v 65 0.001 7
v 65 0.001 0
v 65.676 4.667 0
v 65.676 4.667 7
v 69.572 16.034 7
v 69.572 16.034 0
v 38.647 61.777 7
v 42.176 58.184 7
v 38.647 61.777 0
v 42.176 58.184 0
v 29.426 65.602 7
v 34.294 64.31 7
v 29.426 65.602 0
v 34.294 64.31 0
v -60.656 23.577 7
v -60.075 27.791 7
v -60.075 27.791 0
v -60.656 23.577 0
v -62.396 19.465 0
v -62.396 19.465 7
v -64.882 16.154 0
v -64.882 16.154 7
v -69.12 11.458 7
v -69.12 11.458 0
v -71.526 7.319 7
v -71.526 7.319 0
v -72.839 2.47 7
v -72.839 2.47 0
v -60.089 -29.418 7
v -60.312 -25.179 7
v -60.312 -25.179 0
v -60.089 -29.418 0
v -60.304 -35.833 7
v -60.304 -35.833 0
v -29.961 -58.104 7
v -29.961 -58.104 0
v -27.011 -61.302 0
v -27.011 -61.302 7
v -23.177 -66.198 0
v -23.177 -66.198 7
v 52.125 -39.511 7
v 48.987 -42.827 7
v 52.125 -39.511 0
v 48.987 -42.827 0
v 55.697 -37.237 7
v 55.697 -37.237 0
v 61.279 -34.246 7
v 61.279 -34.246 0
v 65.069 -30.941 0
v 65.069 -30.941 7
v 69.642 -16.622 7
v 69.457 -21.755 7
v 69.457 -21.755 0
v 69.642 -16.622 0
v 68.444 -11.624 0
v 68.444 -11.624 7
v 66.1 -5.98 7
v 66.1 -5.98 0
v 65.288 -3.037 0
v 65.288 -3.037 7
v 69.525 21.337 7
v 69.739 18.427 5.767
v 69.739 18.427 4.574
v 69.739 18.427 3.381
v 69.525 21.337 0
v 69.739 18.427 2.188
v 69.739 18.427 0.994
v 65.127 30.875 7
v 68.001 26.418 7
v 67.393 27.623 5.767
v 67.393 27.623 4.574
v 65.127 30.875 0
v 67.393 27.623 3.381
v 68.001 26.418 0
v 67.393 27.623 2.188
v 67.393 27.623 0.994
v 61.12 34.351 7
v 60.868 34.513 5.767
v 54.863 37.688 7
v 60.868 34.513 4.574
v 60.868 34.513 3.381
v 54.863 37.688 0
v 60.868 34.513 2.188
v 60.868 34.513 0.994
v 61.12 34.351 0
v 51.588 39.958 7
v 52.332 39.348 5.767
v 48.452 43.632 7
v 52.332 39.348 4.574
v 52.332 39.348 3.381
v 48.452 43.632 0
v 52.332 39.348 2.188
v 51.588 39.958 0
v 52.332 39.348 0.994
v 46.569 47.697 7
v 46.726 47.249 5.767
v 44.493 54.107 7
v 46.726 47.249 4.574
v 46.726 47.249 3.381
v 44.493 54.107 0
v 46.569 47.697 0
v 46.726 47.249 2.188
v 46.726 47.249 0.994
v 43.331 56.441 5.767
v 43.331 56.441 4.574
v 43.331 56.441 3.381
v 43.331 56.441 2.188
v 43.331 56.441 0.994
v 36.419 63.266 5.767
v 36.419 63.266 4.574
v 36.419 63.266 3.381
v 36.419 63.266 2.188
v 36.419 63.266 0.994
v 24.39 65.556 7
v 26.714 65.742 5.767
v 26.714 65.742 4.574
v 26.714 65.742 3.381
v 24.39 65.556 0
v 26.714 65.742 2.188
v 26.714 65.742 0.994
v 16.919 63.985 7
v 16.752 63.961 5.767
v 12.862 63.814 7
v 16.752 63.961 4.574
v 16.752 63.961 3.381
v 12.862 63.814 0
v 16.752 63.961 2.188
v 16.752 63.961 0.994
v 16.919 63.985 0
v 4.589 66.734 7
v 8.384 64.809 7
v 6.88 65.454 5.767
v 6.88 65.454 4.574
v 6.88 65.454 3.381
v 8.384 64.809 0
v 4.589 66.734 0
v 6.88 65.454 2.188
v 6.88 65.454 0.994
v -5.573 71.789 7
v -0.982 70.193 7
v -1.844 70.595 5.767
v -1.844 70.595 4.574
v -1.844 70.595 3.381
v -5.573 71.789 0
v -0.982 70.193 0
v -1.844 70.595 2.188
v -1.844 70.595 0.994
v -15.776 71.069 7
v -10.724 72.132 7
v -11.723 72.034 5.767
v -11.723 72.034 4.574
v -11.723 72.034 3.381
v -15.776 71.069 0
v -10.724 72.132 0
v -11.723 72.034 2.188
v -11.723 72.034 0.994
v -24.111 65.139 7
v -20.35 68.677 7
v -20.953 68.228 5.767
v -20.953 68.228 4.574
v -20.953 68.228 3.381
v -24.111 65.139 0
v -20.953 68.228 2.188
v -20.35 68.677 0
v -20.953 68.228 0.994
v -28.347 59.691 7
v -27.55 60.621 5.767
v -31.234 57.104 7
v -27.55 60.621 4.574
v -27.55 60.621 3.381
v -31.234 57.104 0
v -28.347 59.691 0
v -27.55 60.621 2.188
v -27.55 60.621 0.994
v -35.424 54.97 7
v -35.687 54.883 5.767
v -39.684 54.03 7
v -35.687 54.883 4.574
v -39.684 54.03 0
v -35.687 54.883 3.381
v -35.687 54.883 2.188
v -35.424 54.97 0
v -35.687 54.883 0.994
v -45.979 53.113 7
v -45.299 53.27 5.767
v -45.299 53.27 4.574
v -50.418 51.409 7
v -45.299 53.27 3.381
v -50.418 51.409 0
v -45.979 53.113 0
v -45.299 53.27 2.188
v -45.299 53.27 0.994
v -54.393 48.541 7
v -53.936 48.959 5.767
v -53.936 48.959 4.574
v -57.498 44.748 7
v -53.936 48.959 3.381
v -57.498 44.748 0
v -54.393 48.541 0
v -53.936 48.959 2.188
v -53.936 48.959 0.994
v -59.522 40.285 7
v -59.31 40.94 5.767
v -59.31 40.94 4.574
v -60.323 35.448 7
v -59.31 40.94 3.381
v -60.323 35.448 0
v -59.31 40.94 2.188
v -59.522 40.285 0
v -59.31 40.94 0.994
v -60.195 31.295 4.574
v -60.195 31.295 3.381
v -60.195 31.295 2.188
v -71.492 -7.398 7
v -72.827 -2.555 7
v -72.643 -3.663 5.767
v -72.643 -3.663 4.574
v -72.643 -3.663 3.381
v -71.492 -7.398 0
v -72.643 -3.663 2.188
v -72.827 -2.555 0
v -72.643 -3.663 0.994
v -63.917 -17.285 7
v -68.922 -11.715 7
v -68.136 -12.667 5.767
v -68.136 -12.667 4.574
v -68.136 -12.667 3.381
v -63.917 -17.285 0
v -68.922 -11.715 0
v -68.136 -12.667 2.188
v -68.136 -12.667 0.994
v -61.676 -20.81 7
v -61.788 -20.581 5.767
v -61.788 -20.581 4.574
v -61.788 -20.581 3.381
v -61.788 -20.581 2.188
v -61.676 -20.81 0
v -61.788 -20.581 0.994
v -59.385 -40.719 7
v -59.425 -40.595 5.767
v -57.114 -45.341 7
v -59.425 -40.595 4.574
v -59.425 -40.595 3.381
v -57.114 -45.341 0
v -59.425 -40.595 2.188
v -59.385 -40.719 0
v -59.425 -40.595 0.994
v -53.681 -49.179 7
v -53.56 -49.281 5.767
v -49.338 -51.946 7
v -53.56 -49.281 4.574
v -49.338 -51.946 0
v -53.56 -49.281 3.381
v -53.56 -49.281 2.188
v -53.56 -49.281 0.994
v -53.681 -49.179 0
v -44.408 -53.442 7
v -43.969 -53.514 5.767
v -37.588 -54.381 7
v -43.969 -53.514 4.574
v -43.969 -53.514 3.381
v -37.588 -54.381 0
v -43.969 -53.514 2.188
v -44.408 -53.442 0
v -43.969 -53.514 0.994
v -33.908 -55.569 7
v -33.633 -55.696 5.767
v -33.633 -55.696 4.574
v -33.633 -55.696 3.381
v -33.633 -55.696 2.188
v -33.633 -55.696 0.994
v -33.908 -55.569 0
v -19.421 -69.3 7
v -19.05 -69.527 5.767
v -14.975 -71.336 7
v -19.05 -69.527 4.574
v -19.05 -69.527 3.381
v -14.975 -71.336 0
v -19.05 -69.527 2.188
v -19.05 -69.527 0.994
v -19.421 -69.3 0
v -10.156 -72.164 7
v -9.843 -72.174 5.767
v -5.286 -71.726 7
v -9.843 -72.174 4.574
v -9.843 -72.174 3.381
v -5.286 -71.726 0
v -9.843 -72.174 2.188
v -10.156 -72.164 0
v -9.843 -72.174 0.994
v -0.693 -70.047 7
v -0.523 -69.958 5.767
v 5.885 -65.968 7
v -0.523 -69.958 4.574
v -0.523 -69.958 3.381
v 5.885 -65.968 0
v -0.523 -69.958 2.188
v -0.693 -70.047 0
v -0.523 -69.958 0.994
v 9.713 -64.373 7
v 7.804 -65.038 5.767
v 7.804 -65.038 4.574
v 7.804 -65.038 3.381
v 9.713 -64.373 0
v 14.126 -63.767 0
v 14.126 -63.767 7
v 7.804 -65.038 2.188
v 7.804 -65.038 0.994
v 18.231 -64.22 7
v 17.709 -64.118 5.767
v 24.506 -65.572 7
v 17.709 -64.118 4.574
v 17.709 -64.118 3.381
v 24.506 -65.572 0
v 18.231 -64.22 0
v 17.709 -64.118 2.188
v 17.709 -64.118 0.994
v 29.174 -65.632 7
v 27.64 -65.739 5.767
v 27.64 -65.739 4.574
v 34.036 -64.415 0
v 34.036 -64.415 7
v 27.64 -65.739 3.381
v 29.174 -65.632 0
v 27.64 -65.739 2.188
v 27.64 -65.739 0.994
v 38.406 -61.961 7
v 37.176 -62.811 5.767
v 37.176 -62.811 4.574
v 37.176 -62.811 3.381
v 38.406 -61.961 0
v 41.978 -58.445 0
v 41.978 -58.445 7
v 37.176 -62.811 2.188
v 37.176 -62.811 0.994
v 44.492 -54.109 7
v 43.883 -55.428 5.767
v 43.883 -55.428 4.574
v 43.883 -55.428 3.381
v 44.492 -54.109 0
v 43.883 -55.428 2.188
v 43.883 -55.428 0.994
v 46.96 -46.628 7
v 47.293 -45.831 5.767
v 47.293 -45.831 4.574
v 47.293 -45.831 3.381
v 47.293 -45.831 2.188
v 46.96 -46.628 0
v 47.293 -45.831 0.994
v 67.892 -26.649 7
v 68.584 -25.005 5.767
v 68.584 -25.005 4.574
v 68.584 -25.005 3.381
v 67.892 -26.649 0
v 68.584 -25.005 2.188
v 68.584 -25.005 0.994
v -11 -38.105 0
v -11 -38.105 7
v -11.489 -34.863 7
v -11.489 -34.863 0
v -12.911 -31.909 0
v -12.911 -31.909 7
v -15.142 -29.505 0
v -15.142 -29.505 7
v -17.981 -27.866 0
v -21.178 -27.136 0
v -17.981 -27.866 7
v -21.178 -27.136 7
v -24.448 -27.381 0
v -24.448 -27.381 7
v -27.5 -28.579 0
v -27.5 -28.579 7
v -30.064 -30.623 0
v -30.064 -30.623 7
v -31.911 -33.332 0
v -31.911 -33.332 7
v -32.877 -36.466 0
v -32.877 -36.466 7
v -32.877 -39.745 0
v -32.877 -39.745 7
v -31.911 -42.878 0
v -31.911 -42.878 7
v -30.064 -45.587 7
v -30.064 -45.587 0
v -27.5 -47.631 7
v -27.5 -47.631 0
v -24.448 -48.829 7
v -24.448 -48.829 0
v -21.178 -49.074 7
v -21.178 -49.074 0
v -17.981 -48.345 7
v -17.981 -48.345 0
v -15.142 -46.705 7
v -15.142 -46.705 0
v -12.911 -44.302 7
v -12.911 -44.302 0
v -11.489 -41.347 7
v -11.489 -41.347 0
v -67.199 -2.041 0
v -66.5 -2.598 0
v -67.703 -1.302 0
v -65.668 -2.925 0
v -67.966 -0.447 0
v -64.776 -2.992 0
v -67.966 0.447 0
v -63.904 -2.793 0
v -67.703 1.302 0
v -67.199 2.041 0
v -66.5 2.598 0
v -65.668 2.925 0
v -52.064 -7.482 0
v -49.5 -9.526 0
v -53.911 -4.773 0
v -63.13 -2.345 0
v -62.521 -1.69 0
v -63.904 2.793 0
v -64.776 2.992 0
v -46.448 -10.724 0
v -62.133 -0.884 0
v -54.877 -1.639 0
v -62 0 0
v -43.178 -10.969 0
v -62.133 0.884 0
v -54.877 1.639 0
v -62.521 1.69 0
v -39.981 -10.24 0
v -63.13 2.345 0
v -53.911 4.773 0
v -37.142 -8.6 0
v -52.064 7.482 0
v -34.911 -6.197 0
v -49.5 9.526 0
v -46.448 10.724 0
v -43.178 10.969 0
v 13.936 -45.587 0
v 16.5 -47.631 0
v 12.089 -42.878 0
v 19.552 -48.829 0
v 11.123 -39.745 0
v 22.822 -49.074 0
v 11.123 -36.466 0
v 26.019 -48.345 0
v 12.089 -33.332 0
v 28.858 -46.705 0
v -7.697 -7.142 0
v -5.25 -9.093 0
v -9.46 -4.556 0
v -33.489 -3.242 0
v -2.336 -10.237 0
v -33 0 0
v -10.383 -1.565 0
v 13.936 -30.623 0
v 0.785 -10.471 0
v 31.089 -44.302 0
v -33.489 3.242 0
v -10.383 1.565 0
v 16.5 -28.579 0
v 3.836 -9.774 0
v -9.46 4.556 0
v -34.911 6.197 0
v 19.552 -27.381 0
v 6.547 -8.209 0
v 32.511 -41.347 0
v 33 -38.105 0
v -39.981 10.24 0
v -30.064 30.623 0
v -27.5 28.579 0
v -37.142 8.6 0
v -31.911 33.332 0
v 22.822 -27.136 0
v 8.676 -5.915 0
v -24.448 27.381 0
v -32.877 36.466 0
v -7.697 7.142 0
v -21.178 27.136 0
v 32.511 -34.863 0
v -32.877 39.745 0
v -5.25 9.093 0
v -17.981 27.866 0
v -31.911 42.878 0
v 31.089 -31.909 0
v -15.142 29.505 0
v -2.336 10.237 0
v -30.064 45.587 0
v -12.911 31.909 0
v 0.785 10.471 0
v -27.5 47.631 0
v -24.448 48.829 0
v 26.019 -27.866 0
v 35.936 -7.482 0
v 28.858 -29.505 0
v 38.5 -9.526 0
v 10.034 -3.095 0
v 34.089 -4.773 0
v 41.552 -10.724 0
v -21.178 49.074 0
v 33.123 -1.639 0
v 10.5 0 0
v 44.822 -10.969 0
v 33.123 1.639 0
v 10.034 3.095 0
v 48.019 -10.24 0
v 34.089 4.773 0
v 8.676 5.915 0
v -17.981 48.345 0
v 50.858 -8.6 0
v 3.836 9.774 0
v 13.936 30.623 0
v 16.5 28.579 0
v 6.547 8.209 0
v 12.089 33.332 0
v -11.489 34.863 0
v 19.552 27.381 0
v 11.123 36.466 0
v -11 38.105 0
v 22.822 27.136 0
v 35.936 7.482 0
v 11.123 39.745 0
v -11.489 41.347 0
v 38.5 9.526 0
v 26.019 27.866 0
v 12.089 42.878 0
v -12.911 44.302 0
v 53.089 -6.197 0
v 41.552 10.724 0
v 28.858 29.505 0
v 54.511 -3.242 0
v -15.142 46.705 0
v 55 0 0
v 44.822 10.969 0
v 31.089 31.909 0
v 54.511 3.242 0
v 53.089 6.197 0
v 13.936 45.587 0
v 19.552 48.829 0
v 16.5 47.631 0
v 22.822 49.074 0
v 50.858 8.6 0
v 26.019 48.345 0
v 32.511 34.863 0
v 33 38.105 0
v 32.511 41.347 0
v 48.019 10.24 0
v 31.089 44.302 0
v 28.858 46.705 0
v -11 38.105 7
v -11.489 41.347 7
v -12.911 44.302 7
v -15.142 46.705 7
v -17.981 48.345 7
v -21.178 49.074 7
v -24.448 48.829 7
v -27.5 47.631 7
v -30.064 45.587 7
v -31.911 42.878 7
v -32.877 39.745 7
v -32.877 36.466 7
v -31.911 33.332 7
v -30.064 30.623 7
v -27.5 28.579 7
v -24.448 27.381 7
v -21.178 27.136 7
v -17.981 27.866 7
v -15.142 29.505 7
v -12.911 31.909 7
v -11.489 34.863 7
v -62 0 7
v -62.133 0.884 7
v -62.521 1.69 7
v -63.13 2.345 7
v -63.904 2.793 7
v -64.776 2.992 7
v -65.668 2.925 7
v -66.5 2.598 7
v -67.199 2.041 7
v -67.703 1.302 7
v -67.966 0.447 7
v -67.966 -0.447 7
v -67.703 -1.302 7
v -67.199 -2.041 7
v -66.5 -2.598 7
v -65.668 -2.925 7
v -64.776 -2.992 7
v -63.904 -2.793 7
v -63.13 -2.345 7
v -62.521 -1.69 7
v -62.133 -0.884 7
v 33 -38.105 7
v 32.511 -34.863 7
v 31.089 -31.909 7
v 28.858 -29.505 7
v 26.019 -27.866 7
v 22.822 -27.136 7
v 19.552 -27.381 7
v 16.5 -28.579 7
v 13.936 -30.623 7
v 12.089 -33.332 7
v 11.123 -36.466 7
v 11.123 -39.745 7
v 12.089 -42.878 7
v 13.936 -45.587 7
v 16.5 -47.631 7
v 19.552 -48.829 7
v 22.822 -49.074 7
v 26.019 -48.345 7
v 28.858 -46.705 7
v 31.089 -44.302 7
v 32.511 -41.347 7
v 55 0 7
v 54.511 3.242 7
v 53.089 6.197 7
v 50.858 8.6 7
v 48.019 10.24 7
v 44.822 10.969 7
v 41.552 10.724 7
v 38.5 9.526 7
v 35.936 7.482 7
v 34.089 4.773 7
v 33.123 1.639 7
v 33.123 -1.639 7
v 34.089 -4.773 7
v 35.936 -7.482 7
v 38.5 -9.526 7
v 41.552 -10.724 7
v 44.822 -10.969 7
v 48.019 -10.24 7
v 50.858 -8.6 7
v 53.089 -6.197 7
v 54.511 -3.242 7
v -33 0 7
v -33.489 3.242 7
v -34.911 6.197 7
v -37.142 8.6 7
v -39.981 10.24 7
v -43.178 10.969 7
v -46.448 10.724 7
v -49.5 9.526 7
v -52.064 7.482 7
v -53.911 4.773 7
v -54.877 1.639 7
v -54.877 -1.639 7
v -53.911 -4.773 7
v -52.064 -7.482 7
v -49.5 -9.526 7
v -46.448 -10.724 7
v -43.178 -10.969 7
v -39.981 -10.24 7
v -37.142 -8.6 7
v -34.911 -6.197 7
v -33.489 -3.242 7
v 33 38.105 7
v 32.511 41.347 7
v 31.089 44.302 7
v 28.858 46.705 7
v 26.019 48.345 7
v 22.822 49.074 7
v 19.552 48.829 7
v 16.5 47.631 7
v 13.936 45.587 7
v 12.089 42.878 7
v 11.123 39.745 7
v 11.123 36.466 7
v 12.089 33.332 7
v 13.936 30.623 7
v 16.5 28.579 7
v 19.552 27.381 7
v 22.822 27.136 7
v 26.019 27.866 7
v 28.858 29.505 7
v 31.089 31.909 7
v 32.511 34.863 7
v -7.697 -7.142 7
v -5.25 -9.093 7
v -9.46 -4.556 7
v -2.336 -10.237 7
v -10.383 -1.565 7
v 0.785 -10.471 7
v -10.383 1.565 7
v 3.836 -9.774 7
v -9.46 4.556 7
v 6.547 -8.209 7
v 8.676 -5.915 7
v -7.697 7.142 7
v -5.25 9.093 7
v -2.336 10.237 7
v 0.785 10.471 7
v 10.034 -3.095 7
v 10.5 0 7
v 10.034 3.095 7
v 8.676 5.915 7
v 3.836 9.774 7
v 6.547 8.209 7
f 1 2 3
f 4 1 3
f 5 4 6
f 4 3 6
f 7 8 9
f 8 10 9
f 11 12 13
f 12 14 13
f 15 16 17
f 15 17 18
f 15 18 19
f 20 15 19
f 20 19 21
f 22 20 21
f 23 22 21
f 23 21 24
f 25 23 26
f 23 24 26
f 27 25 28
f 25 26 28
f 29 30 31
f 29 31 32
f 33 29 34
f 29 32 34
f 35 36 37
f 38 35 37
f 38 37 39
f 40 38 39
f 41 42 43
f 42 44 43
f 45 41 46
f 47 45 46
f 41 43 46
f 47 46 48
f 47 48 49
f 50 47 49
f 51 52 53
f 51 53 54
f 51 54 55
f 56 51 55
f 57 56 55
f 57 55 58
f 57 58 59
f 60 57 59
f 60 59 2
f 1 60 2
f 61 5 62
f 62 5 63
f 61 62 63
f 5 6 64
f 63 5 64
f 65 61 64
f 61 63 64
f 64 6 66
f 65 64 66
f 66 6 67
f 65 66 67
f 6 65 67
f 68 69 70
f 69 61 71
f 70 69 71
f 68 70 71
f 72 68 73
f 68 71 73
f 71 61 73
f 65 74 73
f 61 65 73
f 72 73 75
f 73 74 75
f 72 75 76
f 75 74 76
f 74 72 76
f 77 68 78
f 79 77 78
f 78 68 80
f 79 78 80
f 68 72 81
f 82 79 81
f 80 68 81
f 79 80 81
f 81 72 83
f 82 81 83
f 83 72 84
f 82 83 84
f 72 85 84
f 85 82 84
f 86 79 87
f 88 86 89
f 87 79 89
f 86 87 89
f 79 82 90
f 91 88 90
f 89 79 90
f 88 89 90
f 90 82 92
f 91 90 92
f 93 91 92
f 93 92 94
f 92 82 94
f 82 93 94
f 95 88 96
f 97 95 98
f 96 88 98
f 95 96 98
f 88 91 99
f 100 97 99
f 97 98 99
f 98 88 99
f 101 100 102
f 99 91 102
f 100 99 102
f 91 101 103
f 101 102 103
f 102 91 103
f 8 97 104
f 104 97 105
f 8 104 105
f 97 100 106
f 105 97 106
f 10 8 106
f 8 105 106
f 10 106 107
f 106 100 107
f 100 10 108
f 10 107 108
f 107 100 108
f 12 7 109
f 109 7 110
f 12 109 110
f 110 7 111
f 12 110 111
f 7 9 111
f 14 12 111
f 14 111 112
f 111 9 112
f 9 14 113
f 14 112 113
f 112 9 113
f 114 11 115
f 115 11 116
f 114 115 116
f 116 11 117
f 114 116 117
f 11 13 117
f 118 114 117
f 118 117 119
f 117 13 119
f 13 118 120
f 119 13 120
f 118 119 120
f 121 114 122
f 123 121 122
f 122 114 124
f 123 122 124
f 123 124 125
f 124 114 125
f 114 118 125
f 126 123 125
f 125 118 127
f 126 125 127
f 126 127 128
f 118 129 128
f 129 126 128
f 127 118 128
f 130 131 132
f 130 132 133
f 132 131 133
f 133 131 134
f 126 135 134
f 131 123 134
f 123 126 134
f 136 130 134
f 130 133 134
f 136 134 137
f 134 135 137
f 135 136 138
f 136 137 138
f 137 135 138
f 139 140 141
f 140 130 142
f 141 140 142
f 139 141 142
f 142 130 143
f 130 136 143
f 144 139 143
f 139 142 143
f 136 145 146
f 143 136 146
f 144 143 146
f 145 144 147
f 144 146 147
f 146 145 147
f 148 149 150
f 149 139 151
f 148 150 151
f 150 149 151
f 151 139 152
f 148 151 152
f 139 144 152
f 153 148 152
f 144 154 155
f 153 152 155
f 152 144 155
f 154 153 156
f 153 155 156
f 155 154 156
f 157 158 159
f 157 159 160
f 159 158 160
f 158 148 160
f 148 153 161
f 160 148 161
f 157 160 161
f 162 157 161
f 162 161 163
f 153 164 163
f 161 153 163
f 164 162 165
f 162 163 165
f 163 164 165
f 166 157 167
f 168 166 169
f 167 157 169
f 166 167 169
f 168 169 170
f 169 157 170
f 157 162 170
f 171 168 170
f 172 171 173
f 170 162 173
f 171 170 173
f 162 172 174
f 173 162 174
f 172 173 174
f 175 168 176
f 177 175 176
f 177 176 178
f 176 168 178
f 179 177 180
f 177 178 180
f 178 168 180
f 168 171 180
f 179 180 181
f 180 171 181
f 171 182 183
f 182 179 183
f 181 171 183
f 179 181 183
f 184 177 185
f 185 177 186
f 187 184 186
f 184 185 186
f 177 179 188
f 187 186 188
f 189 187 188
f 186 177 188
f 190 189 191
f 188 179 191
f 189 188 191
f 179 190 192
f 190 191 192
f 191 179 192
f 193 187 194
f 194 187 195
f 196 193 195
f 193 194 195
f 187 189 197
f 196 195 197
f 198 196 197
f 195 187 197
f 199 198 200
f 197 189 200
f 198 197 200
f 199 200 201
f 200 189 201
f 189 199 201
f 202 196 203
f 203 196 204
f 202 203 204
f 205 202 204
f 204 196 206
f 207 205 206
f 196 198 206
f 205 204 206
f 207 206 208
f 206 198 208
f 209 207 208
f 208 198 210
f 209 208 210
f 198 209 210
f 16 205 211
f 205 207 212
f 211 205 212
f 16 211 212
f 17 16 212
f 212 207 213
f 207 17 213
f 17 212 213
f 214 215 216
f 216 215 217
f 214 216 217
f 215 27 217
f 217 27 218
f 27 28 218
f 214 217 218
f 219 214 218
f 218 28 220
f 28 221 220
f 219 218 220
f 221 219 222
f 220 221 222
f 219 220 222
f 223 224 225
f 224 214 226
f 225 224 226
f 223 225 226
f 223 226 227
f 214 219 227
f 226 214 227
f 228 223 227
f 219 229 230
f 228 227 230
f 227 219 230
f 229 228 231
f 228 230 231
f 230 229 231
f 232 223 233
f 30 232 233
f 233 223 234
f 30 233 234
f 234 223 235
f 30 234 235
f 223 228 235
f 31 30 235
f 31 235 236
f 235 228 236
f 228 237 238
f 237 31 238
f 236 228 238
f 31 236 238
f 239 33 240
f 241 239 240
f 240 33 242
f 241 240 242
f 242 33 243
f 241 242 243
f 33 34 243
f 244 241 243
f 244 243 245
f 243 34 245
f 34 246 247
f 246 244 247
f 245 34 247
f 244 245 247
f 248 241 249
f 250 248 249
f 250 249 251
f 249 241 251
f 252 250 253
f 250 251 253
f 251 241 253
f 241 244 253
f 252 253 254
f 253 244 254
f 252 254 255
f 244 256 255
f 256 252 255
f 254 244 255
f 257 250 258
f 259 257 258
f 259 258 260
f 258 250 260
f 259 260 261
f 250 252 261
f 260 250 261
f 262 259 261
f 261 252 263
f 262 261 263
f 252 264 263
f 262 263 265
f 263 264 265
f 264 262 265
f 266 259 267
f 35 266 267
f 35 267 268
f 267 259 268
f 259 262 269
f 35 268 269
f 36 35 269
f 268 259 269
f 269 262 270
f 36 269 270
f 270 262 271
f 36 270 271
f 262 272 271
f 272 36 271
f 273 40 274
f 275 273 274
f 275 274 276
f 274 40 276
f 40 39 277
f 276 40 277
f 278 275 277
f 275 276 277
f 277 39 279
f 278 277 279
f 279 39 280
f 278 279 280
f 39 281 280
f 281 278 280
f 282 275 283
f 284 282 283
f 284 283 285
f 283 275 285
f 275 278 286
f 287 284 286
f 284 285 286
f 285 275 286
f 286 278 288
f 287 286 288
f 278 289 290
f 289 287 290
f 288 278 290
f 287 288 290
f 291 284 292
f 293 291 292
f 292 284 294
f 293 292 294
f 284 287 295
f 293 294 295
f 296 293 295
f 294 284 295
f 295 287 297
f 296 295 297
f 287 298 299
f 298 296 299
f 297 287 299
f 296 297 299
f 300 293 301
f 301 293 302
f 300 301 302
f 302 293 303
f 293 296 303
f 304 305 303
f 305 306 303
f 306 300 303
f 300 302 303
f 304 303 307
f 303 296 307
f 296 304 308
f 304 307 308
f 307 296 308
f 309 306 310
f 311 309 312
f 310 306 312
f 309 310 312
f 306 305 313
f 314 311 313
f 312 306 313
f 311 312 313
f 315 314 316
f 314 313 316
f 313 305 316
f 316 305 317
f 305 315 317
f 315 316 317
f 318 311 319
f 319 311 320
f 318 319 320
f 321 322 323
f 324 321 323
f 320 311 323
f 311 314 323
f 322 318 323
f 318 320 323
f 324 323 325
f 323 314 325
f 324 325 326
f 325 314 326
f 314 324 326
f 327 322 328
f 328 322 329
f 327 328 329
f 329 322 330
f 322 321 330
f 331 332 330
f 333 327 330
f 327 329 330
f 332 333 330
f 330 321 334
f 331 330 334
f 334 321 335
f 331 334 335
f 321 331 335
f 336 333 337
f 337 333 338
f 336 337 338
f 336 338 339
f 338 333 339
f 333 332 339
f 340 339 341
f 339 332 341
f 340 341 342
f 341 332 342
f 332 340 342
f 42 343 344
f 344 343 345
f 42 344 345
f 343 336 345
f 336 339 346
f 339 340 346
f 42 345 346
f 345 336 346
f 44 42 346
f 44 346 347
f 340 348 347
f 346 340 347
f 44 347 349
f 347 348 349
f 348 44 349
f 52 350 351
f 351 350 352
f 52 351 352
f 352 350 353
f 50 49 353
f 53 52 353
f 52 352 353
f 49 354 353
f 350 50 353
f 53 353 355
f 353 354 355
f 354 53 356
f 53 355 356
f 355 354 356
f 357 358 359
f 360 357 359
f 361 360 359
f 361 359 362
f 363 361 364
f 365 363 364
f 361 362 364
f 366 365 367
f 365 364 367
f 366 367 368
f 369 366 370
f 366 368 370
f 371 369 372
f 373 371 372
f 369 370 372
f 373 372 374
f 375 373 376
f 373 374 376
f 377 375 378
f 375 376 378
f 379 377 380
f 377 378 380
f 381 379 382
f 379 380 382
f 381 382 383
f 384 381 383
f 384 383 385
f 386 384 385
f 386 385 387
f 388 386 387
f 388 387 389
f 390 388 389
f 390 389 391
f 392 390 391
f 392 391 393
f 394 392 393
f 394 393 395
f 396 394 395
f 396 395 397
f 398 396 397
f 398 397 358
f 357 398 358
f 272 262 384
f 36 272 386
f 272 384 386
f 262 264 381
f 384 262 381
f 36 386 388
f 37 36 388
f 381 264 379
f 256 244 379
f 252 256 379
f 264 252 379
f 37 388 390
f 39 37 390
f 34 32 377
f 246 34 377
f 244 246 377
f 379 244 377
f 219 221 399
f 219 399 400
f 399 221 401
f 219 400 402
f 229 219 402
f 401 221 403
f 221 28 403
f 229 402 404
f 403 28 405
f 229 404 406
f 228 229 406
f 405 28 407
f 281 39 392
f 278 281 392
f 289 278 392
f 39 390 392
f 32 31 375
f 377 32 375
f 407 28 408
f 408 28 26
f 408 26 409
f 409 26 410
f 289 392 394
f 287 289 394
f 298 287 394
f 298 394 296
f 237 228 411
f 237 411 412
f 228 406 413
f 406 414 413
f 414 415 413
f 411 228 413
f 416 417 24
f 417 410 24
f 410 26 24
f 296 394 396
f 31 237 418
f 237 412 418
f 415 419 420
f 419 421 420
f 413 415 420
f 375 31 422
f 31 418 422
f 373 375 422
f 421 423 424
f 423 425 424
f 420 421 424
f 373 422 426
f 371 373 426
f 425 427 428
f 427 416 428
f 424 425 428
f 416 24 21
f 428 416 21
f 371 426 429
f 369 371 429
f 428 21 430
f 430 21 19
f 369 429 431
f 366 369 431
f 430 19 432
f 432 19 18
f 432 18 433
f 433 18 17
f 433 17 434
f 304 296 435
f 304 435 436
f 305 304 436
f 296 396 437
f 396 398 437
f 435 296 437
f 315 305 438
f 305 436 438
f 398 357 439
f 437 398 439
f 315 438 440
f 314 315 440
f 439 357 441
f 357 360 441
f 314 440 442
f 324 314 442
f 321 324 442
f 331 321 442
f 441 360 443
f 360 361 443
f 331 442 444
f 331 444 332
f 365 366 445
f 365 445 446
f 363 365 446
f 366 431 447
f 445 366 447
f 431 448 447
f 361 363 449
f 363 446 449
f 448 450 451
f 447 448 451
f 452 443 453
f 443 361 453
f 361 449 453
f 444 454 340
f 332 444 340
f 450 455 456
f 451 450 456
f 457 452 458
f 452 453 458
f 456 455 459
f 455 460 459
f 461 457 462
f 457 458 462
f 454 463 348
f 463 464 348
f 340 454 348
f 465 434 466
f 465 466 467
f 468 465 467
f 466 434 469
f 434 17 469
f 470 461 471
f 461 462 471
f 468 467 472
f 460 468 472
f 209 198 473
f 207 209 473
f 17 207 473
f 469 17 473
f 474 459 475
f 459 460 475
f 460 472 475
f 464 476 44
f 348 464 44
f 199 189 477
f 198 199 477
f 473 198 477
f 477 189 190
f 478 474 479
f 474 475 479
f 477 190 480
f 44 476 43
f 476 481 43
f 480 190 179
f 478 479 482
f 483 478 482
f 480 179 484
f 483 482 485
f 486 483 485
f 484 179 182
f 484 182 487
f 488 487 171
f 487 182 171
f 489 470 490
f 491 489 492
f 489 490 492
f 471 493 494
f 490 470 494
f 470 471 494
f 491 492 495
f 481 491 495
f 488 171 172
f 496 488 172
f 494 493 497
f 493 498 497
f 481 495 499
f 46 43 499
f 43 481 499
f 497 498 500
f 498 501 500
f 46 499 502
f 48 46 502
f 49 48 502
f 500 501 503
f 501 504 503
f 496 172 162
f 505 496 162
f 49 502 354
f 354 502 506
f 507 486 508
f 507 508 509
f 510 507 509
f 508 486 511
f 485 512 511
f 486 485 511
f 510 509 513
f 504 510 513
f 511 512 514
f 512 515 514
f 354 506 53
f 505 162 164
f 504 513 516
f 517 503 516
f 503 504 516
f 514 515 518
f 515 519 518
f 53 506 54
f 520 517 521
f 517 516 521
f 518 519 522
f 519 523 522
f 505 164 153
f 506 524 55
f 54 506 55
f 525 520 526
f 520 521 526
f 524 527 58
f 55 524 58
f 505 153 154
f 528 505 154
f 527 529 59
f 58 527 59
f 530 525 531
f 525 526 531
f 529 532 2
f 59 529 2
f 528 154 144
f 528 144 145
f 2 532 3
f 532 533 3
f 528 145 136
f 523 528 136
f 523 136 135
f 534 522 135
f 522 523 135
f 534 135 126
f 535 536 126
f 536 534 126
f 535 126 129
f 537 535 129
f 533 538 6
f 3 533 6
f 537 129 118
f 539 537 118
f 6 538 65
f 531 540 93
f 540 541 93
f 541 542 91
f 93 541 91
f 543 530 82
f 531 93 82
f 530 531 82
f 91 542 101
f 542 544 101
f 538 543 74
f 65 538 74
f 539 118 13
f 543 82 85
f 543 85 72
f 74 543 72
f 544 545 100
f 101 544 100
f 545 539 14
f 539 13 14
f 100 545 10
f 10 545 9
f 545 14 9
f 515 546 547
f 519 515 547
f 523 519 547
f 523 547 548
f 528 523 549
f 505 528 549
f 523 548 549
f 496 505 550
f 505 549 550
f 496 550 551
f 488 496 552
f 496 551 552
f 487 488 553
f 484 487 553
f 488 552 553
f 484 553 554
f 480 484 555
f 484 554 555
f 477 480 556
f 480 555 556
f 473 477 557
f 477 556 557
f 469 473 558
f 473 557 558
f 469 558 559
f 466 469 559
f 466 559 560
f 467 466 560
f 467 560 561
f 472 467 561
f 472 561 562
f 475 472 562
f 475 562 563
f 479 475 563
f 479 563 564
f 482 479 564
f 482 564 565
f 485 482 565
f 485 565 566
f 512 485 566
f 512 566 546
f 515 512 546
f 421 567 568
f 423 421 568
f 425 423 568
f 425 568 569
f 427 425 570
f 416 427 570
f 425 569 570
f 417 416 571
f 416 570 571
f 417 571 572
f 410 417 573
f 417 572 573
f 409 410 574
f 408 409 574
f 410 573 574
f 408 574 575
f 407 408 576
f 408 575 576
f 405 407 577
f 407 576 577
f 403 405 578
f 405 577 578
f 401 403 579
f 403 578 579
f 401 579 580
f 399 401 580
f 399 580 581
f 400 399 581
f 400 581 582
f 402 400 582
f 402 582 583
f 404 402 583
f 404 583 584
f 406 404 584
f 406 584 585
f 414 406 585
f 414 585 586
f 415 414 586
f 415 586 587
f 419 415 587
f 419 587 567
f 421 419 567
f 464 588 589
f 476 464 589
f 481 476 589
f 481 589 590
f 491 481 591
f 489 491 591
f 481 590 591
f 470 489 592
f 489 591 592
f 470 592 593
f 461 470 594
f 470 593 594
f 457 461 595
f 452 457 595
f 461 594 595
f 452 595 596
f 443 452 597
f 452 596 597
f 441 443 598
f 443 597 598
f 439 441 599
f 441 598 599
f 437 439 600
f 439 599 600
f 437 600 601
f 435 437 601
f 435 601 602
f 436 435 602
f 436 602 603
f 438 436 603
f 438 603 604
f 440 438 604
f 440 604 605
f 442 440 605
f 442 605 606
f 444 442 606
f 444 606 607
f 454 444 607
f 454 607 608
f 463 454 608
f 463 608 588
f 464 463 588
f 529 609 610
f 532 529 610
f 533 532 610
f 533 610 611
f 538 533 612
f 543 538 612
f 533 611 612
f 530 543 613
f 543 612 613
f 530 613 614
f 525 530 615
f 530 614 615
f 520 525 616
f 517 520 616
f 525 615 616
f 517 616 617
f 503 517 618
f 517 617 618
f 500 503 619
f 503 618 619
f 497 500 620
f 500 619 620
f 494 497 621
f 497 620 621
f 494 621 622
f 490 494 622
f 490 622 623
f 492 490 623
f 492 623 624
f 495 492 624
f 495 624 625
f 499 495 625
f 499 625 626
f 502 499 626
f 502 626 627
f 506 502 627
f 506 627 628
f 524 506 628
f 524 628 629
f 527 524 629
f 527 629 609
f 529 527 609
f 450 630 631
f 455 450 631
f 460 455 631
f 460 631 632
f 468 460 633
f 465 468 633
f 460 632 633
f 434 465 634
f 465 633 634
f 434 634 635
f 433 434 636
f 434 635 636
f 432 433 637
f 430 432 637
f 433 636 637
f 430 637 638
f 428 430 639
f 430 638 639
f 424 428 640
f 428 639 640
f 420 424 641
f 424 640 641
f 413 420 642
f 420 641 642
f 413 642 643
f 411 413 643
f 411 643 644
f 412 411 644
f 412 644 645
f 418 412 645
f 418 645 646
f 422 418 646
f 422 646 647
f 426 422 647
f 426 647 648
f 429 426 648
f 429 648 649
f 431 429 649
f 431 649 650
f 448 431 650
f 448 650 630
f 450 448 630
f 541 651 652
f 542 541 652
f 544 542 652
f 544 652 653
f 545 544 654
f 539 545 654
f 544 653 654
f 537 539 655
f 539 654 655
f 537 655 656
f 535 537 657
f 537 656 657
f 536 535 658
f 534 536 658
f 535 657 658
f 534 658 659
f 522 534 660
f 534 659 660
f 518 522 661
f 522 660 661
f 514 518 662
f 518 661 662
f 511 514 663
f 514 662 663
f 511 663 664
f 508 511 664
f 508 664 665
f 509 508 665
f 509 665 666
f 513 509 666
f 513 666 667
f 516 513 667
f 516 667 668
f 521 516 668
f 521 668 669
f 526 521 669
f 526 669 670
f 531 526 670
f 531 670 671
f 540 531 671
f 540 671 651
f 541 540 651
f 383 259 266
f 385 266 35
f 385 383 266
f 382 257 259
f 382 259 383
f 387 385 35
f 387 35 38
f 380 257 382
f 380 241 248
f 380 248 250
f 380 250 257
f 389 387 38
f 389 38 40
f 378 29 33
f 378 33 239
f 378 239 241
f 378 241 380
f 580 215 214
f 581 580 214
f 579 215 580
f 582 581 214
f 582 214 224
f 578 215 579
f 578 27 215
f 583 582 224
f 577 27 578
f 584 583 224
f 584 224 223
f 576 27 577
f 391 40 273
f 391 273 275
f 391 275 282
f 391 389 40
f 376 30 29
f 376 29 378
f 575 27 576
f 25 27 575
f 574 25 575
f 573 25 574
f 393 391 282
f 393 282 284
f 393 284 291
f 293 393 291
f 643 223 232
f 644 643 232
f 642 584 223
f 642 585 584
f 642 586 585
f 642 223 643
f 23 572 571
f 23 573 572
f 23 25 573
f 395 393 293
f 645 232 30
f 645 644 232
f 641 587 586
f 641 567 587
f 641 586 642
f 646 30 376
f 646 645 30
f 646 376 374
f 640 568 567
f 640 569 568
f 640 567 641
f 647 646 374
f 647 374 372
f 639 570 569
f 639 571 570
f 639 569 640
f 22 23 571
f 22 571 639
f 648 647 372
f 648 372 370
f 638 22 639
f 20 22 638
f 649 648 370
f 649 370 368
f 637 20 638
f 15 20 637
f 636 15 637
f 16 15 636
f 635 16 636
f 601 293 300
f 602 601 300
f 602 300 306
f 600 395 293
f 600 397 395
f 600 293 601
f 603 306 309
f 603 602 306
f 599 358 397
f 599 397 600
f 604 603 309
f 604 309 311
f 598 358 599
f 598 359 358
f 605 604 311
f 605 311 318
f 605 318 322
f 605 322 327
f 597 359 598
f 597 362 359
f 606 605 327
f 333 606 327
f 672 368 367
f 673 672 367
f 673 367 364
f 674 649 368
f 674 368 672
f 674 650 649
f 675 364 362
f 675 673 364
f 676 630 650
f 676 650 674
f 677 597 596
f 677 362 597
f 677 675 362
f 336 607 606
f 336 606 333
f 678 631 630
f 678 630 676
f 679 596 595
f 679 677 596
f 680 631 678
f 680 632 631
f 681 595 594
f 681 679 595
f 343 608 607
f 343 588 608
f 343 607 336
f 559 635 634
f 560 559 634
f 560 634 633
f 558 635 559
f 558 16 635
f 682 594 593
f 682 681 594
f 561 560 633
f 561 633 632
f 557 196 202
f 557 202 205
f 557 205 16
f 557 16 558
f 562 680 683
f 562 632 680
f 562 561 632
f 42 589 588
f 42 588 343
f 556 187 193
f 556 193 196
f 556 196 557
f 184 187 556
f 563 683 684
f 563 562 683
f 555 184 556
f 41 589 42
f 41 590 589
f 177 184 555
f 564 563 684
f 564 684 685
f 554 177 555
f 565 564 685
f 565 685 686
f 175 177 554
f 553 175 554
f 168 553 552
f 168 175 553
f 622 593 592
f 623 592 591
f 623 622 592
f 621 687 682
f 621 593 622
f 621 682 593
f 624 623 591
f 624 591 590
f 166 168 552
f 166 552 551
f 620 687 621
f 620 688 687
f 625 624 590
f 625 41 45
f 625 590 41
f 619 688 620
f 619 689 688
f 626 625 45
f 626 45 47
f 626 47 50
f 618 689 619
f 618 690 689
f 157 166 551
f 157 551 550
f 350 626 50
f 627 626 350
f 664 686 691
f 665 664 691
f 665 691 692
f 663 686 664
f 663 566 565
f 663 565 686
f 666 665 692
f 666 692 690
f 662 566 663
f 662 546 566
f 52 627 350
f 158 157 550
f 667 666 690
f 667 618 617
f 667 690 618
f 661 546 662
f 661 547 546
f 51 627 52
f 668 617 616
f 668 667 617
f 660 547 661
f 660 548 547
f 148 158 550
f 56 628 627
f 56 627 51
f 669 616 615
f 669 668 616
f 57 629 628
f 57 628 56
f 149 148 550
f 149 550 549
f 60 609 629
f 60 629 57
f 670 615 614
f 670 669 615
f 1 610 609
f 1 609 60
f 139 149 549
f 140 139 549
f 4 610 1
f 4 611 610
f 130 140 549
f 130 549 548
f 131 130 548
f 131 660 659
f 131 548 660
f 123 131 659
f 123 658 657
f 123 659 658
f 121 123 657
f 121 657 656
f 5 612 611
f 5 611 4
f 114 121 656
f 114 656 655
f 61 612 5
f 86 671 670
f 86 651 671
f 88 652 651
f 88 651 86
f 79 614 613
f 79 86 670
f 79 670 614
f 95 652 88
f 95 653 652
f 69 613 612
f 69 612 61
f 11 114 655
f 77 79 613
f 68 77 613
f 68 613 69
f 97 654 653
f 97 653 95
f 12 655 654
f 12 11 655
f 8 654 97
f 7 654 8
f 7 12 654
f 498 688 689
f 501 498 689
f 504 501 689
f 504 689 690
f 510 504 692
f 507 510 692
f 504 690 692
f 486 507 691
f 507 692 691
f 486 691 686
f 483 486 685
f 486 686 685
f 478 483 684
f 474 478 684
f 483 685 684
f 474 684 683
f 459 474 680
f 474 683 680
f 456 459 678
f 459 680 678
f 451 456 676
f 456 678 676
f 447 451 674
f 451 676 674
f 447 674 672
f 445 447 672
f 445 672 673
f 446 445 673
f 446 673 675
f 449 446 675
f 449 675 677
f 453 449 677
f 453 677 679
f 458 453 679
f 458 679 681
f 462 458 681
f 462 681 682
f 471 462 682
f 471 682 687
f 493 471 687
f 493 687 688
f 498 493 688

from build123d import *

# Parameters (mm, degrees)
BOSS_EXTRUDE1_DEPTH = 7
SKETCH2_R           = 11
CUT_EXTRUDE1_DEPTH  = 103.897295537
SKETCH3_R           = 10.5
CUT_EXTRUDE2_DEPTH  = 103.897295537
SKETCH4_R           = 3
CUT_EXTRUDE3_DEPTH  = 103.897295537


with BuildPart() as part:
    # Sketch1 → Boss-Extrude1 (new body)
    with BuildSketch(Plane.XY):
        with BuildLine():
            add(Edge.make_bspline(
                [(64.999997419, 0.000806947), (65.00000609, 0.21013312), (65.007534948, 0.64054093), (65.042332664, 1.291380489), (65.135594495, 2.159460023), (65.277248851, 3.032680008), (65.493830203, 4.038569318), (65.809087942, 5.168293211), (66.3609477, 6.758386753), (67.195560637, 8.680353986), (68.186353458, 10.826517495), (69.006376801, 13.131037551), (69.49208346, 15.232893556), (69.778704141, 17.621751772), (69.758565384, 20.283615304), (69.242050418, 23.384282514), (67.989755767, 26.780516545), (66.100351811, 29.905060607), (63.985642903, 32.22443192), (61.963179868, 33.833106887), (59.924357249, 35.117342135), (58.002602637, 36.111433425), (55.773019988, 37.145335072), (53.157717558, 38.627233325), (50.663432719, 40.61244418), (48.177244341, 43.633158774), (46.549449378, 47.248622642), (45.678840997, 50.853036944), (44.487714221, 54.371357413), (42.978225844, 57.263635788), (40.837389165, 60.000224897), (38.049129423, 62.402846227), (34.85625957, 64.226264819), (31.374996628, 65.405595202), (27.906716495, 65.863536097), (24.590928635, 65.686380175), (21.60649148, 65.05079625), (18.916301522, 64.32307683), (15.998824641, 63.774192759), (12.847584732, 63.668028743), (9.728816556, 64.215195529), (6.802016032, 65.388148141), (4.246370247, 66.898838322), (1.967008792, 68.502393598), (-0.618218868, 70.123158088), (-3.671586225, 71.428030238), (-7.086254723, 72.188828978), (-10.76079625, 72.276450148), (-14.385647807, 71.660073729), (-17.829274613, 70.360829533), (-20.779679678, 68.525713643), (-23.190373511, 66.327558714), (-25.516643206, 63.431388327), (-27.565898104, 60.341268628), (-30.327307182, 57.496189029), (-33.693402094, 55.502540068), (-36.714668658, 54.4848558), (-39.309815704, 54.046474509), (-41.383983168, 53.836930402), (-43.161911331, 53.642278824), (-44.638619491, 53.420081839), (-46.62901432, 52.992886762), (-49.081018776, 52.175907503), (-51.863431912, 50.724039888), (-54.737535189, 48.416484059), (-57.117755121, 45.598389652), (-58.915184236, 42.372849822), (-59.987505481, 39.048729025), (-60.406669899, 35.790711752), (-60.325551079, 32.752234211), (-60.072329686, 29.966065889), (-60.013760517, 26.959013226), (-60.450787322, 23.76610463), (-61.549631637, 20.723753194), (-63.253776488, 17.988179386), (-64.989814093, 15.987160092), (-66.447032939, 14.499376804), (-67.657205891, 13.224642472), (-68.599672039, 12.146432903), (-69.536773989, 10.932049653), (-70.432812405, 9.563522537), (-71.249982649, 8.029694321), (-71.950438385, 6.329058177), (-72.480134133, 4.567748418), (-72.835401264, 2.763237252), (-72.969755125, 1.387355273), (-72.999876295, 0.466180194), (-72.999999894, 0.004048412), (-73.000000052, 0.000971906), (-73.000000061, 0.000809922), (-73.000000067, 0.000647937), (-73.000000077, 0.000323969), (-73.000000078, 0), (-73.000000077, -0.000323969), (-73.000000067, -0.000647937), (-73.000000061, -0.000809922), (-73.000000052, -0.000971906), (-72.999999894, -0.004048412), (-72.999876295, -0.466180194), (-72.969755125, -1.387355273), (-72.835401264, -2.763237252), (-72.480134133, -4.567748418), (-71.950438385, -6.329058177), (-71.249982649, -8.029694321), (-70.432812405, -9.563522537), (-69.536773989, -10.932049653), (-68.599672039, -12.146432903), (-67.657205891, -13.224642472), (-66.447032939, -14.499376804), (-64.989814093, -15.987160092), (-63.253776488, -17.988179386), (-61.549631637, -20.723753194), (-60.450787322, -23.76610463), (-60.013760517, -26.959013226), (-60.072329686, -29.966065889), (-60.325551079, -32.752234211), (-60.406669899, -35.790711752), (-59.987505481, -39.048729025), (-58.915184237, -42.372849822), (-57.117755121, -45.598389652), (-54.737535189, -48.416484059), (-51.863431912, -50.724039888), (-49.081018776, -52.175907503), (-46.62901432, -52.992886762), (-44.638619491, -53.420081839), (-43.161911332, -53.642278824), (-41.383983168, -53.836930402), (-39.309815704, -54.046474509), (-36.714668658, -54.4848558), (-33.693402094, -55.502540068), (-30.327307182, -57.496189029), (-27.565898104, -60.341268628), (-25.516643206, -63.431388327), (-23.190373511, -66.327558714), (-20.779679678, -68.525713643), (-17.829274613, -70.360829533), (-14.385647807, -71.660073729), (-10.76079625, -72.276450148), (-7.086254723, -72.188828978), (-3.671586225, -71.428030238), (-0.618218868, -70.123158088), (1.967008792, -68.502393598), (4.246370247, -66.898838322), (6.802016032, -65.388148141), (9.728816556, -64.215195529), (12.847584732, -63.668028743), (15.998824641, -63.774192759), (18.916301522, -64.32307683), (21.60649148, -65.05079625), (24.590928635, -65.686380175), (27.906716495, -65.863536097), (31.374996628, -65.405595202), (34.85625957, -64.226264819), (38.049129423, -62.402846227), (40.837389165, -60.000224897), (42.978225844, -57.263635788), (44.487714221, -54.371357413), (45.678840997, -50.853036944), (46.549449378, -47.248622642), (48.177244341, -43.633158774), (50.663432719, -40.61244418), (53.157717558, -38.627233325), (55.773019988, -37.145335072), (58.002602637, -36.111433425), (59.924357249, -35.117342135), (61.963179868, -33.833106887), (63.985642903, -32.22443192), (66.100351811, -29.905060607), (67.989755767, -26.780516545), (69.242050418, -23.384282514), (69.758565384, -20.283615304), (69.778704141, -17.621751772), (69.49208346, -15.232893556), (69.006376801, -13.131037551), (68.186353458, -10.826517495), (67.195560637, -8.680353986), (66.3609477, -6.758386753), (65.809087942, -5.168293211), (65.493830203, -4.038569318), (65.277248851, -3.032680008), (65.135594495, -2.159460023), (65.042332664, -1.291380489), (65.007534948, -0.64054093), (65.00000609, -0.21013312), (64.999997419, -0.000806947), (64.999997413, -0.000672456), (64.999997409, -0.000537965), (64.999997404, -0.000268982), (64.999997403, 0), (64.999997404, 0.000268982), (64.999997409, 0.000537965), (64.999997413, 0.000672456), (64.999997419, 0.000806947)],
                knots=[0, 0, 0, 0, 0, 0.001798777, 0.003698603, 0.00559843, 0.007498256, 0.009398082, 0.012535417, 0.015672752, 0.021947422, 0.027396838, 0.032846254, 0.036645323, 0.040444391, 0.048041714, 0.055639404, 0.063501433, 0.071363833, 0.079226058, 0.082432391, 0.085638724, 0.092051389, 0.097801992, 0.103552594, 0.111417656, 0.119282983, 0.131114721, 0.137196367, 0.143278014, 0.151140149, 0.159002594, 0.16686461, 0.174705586, 0.182546939, 0.190388196, 0.196737094, 0.203085992, 0.208716671, 0.214347349, 0.222191946, 0.230036411, 0.235667159, 0.241297906, 0.247646828, 0.253995749, 0.261837005, 0.269678347, 0.277519325, 0.285381338, 0.293243791, 0.301105902, 0.307187582, 0.313269263, 0.325100906, 0.332966249, 0.34083107, 0.346581787, 0.352332504, 0.355538846, 0.358745188, 0.36195153, 0.365157871, 0.373020109, 0.380882498, 0.388744531, 0.396634104, 0.404524032, 0.412413638, 0.418564342, 0.424715045, 0.430589756, 0.436464467, 0.444357156, 0.452249357, 0.458124314, 0.463999271, 0.467074598, 0.470149925, 0.473225253, 0.47630058, 0.480245422, 0.484190263, 0.488135211, 0.492080159, 0.49602495, 0.499969741, 0.499996178, 0.499996178, 0.499996178, 0.499996178, 0.49999757, 0.49999757, 0.499998962, 0.499998962, 0.500000354, 0.500000354, 0.500000354, 0.500000354, 0.500026792, 0.503971583, 0.507916373, 0.511861322, 0.51580627, 0.519751111, 0.523695953, 0.52677128, 0.529846607, 0.532921935, 0.535997262, 0.541872219, 0.547747176, 0.555639377, 0.563532065, 0.569406776, 0.575281487, 0.581432191, 0.587582895, 0.595472501, 0.603362429, 0.611252002, 0.619114034, 0.626976424, 0.634838661, 0.638045003, 0.641251345, 0.644457687, 0.647664029, 0.653414746, 0.659165463, 0.667030284, 0.674895627, 0.68672727, 0.69280895, 0.698890631, 0.706752742, 0.714615194, 0.722477207, 0.730318186, 0.738159528, 0.746000784, 0.752349705, 0.758698626, 0.764329374, 0.769960122, 0.777804587, 0.785649184, 0.791279862, 0.796910541, 0.803259439, 0.809608337, 0.817449594, 0.825290947, 0.833131923, 0.840993939, 0.848856384, 0.856718519, 0.862800165, 0.868881812, 0.88071355, 0.888578877, 0.896443939, 0.902194541, 0.907945144, 0.914357809, 0.917564142, 0.920770475, 0.9286327, 0.9364951, 0.944357129, 0.951954819, 0.959552142, 0.96335121, 0.967150279, 0.972599695, 0.978049111, 0.984323781, 0.987461116, 0.990598451, 0.992498277, 0.994398103, 0.99629793, 0.998197756, 0.999996533, 0.999996533, 0.999996533, 0.999996533, 0.999997689, 0.999997689, 0.999998844, 0.999998844, 1, 1, 1, 1, 1], degree=4))
        make_face()
    extrude(amount=BOSS_EXTRUDE1_DEPTH)

    # Sketch2 → Cut-Extrude1 (cut, through all)
    with BuildSketch(Plane.XY.offset(7)):
        with Locations((-44, 0)):
            Circle(SKETCH2_R)
        with Locations((-22, 38.105117767)):
            Circle(SKETCH2_R)
        with Locations((22, 38.105117767)):
            Circle(SKETCH2_R)
        with Locations((44, 0)):
            Circle(SKETCH2_R)
        with Locations((22, -38.105117767)):
            Circle(SKETCH2_R)
        with Locations((-22, -38.105117767)):
            Circle(SKETCH2_R)
    extrude(amount=-CUT_EXTRUDE1_DEPTH, mode=Mode.SUBTRACT)

    # Sketch3 → Cut-Extrude2 (cut, through all)
    with BuildSketch(Plane.XY.offset(7)):
        Circle(SKETCH3_R)
    extrude(amount=-CUT_EXTRUDE2_DEPTH, mode=Mode.SUBTRACT)

    # Sketch4 → Cut-Extrude3 (cut, through all)
    with BuildSketch(Plane.XY.offset(7)):
        with Locations((-65, 0)):
            Circle(SKETCH4_R)
    extrude(amount=-CUT_EXTRUDE3_DEPTH, mode=Mode.SUBTRACT)


solid = part.part
